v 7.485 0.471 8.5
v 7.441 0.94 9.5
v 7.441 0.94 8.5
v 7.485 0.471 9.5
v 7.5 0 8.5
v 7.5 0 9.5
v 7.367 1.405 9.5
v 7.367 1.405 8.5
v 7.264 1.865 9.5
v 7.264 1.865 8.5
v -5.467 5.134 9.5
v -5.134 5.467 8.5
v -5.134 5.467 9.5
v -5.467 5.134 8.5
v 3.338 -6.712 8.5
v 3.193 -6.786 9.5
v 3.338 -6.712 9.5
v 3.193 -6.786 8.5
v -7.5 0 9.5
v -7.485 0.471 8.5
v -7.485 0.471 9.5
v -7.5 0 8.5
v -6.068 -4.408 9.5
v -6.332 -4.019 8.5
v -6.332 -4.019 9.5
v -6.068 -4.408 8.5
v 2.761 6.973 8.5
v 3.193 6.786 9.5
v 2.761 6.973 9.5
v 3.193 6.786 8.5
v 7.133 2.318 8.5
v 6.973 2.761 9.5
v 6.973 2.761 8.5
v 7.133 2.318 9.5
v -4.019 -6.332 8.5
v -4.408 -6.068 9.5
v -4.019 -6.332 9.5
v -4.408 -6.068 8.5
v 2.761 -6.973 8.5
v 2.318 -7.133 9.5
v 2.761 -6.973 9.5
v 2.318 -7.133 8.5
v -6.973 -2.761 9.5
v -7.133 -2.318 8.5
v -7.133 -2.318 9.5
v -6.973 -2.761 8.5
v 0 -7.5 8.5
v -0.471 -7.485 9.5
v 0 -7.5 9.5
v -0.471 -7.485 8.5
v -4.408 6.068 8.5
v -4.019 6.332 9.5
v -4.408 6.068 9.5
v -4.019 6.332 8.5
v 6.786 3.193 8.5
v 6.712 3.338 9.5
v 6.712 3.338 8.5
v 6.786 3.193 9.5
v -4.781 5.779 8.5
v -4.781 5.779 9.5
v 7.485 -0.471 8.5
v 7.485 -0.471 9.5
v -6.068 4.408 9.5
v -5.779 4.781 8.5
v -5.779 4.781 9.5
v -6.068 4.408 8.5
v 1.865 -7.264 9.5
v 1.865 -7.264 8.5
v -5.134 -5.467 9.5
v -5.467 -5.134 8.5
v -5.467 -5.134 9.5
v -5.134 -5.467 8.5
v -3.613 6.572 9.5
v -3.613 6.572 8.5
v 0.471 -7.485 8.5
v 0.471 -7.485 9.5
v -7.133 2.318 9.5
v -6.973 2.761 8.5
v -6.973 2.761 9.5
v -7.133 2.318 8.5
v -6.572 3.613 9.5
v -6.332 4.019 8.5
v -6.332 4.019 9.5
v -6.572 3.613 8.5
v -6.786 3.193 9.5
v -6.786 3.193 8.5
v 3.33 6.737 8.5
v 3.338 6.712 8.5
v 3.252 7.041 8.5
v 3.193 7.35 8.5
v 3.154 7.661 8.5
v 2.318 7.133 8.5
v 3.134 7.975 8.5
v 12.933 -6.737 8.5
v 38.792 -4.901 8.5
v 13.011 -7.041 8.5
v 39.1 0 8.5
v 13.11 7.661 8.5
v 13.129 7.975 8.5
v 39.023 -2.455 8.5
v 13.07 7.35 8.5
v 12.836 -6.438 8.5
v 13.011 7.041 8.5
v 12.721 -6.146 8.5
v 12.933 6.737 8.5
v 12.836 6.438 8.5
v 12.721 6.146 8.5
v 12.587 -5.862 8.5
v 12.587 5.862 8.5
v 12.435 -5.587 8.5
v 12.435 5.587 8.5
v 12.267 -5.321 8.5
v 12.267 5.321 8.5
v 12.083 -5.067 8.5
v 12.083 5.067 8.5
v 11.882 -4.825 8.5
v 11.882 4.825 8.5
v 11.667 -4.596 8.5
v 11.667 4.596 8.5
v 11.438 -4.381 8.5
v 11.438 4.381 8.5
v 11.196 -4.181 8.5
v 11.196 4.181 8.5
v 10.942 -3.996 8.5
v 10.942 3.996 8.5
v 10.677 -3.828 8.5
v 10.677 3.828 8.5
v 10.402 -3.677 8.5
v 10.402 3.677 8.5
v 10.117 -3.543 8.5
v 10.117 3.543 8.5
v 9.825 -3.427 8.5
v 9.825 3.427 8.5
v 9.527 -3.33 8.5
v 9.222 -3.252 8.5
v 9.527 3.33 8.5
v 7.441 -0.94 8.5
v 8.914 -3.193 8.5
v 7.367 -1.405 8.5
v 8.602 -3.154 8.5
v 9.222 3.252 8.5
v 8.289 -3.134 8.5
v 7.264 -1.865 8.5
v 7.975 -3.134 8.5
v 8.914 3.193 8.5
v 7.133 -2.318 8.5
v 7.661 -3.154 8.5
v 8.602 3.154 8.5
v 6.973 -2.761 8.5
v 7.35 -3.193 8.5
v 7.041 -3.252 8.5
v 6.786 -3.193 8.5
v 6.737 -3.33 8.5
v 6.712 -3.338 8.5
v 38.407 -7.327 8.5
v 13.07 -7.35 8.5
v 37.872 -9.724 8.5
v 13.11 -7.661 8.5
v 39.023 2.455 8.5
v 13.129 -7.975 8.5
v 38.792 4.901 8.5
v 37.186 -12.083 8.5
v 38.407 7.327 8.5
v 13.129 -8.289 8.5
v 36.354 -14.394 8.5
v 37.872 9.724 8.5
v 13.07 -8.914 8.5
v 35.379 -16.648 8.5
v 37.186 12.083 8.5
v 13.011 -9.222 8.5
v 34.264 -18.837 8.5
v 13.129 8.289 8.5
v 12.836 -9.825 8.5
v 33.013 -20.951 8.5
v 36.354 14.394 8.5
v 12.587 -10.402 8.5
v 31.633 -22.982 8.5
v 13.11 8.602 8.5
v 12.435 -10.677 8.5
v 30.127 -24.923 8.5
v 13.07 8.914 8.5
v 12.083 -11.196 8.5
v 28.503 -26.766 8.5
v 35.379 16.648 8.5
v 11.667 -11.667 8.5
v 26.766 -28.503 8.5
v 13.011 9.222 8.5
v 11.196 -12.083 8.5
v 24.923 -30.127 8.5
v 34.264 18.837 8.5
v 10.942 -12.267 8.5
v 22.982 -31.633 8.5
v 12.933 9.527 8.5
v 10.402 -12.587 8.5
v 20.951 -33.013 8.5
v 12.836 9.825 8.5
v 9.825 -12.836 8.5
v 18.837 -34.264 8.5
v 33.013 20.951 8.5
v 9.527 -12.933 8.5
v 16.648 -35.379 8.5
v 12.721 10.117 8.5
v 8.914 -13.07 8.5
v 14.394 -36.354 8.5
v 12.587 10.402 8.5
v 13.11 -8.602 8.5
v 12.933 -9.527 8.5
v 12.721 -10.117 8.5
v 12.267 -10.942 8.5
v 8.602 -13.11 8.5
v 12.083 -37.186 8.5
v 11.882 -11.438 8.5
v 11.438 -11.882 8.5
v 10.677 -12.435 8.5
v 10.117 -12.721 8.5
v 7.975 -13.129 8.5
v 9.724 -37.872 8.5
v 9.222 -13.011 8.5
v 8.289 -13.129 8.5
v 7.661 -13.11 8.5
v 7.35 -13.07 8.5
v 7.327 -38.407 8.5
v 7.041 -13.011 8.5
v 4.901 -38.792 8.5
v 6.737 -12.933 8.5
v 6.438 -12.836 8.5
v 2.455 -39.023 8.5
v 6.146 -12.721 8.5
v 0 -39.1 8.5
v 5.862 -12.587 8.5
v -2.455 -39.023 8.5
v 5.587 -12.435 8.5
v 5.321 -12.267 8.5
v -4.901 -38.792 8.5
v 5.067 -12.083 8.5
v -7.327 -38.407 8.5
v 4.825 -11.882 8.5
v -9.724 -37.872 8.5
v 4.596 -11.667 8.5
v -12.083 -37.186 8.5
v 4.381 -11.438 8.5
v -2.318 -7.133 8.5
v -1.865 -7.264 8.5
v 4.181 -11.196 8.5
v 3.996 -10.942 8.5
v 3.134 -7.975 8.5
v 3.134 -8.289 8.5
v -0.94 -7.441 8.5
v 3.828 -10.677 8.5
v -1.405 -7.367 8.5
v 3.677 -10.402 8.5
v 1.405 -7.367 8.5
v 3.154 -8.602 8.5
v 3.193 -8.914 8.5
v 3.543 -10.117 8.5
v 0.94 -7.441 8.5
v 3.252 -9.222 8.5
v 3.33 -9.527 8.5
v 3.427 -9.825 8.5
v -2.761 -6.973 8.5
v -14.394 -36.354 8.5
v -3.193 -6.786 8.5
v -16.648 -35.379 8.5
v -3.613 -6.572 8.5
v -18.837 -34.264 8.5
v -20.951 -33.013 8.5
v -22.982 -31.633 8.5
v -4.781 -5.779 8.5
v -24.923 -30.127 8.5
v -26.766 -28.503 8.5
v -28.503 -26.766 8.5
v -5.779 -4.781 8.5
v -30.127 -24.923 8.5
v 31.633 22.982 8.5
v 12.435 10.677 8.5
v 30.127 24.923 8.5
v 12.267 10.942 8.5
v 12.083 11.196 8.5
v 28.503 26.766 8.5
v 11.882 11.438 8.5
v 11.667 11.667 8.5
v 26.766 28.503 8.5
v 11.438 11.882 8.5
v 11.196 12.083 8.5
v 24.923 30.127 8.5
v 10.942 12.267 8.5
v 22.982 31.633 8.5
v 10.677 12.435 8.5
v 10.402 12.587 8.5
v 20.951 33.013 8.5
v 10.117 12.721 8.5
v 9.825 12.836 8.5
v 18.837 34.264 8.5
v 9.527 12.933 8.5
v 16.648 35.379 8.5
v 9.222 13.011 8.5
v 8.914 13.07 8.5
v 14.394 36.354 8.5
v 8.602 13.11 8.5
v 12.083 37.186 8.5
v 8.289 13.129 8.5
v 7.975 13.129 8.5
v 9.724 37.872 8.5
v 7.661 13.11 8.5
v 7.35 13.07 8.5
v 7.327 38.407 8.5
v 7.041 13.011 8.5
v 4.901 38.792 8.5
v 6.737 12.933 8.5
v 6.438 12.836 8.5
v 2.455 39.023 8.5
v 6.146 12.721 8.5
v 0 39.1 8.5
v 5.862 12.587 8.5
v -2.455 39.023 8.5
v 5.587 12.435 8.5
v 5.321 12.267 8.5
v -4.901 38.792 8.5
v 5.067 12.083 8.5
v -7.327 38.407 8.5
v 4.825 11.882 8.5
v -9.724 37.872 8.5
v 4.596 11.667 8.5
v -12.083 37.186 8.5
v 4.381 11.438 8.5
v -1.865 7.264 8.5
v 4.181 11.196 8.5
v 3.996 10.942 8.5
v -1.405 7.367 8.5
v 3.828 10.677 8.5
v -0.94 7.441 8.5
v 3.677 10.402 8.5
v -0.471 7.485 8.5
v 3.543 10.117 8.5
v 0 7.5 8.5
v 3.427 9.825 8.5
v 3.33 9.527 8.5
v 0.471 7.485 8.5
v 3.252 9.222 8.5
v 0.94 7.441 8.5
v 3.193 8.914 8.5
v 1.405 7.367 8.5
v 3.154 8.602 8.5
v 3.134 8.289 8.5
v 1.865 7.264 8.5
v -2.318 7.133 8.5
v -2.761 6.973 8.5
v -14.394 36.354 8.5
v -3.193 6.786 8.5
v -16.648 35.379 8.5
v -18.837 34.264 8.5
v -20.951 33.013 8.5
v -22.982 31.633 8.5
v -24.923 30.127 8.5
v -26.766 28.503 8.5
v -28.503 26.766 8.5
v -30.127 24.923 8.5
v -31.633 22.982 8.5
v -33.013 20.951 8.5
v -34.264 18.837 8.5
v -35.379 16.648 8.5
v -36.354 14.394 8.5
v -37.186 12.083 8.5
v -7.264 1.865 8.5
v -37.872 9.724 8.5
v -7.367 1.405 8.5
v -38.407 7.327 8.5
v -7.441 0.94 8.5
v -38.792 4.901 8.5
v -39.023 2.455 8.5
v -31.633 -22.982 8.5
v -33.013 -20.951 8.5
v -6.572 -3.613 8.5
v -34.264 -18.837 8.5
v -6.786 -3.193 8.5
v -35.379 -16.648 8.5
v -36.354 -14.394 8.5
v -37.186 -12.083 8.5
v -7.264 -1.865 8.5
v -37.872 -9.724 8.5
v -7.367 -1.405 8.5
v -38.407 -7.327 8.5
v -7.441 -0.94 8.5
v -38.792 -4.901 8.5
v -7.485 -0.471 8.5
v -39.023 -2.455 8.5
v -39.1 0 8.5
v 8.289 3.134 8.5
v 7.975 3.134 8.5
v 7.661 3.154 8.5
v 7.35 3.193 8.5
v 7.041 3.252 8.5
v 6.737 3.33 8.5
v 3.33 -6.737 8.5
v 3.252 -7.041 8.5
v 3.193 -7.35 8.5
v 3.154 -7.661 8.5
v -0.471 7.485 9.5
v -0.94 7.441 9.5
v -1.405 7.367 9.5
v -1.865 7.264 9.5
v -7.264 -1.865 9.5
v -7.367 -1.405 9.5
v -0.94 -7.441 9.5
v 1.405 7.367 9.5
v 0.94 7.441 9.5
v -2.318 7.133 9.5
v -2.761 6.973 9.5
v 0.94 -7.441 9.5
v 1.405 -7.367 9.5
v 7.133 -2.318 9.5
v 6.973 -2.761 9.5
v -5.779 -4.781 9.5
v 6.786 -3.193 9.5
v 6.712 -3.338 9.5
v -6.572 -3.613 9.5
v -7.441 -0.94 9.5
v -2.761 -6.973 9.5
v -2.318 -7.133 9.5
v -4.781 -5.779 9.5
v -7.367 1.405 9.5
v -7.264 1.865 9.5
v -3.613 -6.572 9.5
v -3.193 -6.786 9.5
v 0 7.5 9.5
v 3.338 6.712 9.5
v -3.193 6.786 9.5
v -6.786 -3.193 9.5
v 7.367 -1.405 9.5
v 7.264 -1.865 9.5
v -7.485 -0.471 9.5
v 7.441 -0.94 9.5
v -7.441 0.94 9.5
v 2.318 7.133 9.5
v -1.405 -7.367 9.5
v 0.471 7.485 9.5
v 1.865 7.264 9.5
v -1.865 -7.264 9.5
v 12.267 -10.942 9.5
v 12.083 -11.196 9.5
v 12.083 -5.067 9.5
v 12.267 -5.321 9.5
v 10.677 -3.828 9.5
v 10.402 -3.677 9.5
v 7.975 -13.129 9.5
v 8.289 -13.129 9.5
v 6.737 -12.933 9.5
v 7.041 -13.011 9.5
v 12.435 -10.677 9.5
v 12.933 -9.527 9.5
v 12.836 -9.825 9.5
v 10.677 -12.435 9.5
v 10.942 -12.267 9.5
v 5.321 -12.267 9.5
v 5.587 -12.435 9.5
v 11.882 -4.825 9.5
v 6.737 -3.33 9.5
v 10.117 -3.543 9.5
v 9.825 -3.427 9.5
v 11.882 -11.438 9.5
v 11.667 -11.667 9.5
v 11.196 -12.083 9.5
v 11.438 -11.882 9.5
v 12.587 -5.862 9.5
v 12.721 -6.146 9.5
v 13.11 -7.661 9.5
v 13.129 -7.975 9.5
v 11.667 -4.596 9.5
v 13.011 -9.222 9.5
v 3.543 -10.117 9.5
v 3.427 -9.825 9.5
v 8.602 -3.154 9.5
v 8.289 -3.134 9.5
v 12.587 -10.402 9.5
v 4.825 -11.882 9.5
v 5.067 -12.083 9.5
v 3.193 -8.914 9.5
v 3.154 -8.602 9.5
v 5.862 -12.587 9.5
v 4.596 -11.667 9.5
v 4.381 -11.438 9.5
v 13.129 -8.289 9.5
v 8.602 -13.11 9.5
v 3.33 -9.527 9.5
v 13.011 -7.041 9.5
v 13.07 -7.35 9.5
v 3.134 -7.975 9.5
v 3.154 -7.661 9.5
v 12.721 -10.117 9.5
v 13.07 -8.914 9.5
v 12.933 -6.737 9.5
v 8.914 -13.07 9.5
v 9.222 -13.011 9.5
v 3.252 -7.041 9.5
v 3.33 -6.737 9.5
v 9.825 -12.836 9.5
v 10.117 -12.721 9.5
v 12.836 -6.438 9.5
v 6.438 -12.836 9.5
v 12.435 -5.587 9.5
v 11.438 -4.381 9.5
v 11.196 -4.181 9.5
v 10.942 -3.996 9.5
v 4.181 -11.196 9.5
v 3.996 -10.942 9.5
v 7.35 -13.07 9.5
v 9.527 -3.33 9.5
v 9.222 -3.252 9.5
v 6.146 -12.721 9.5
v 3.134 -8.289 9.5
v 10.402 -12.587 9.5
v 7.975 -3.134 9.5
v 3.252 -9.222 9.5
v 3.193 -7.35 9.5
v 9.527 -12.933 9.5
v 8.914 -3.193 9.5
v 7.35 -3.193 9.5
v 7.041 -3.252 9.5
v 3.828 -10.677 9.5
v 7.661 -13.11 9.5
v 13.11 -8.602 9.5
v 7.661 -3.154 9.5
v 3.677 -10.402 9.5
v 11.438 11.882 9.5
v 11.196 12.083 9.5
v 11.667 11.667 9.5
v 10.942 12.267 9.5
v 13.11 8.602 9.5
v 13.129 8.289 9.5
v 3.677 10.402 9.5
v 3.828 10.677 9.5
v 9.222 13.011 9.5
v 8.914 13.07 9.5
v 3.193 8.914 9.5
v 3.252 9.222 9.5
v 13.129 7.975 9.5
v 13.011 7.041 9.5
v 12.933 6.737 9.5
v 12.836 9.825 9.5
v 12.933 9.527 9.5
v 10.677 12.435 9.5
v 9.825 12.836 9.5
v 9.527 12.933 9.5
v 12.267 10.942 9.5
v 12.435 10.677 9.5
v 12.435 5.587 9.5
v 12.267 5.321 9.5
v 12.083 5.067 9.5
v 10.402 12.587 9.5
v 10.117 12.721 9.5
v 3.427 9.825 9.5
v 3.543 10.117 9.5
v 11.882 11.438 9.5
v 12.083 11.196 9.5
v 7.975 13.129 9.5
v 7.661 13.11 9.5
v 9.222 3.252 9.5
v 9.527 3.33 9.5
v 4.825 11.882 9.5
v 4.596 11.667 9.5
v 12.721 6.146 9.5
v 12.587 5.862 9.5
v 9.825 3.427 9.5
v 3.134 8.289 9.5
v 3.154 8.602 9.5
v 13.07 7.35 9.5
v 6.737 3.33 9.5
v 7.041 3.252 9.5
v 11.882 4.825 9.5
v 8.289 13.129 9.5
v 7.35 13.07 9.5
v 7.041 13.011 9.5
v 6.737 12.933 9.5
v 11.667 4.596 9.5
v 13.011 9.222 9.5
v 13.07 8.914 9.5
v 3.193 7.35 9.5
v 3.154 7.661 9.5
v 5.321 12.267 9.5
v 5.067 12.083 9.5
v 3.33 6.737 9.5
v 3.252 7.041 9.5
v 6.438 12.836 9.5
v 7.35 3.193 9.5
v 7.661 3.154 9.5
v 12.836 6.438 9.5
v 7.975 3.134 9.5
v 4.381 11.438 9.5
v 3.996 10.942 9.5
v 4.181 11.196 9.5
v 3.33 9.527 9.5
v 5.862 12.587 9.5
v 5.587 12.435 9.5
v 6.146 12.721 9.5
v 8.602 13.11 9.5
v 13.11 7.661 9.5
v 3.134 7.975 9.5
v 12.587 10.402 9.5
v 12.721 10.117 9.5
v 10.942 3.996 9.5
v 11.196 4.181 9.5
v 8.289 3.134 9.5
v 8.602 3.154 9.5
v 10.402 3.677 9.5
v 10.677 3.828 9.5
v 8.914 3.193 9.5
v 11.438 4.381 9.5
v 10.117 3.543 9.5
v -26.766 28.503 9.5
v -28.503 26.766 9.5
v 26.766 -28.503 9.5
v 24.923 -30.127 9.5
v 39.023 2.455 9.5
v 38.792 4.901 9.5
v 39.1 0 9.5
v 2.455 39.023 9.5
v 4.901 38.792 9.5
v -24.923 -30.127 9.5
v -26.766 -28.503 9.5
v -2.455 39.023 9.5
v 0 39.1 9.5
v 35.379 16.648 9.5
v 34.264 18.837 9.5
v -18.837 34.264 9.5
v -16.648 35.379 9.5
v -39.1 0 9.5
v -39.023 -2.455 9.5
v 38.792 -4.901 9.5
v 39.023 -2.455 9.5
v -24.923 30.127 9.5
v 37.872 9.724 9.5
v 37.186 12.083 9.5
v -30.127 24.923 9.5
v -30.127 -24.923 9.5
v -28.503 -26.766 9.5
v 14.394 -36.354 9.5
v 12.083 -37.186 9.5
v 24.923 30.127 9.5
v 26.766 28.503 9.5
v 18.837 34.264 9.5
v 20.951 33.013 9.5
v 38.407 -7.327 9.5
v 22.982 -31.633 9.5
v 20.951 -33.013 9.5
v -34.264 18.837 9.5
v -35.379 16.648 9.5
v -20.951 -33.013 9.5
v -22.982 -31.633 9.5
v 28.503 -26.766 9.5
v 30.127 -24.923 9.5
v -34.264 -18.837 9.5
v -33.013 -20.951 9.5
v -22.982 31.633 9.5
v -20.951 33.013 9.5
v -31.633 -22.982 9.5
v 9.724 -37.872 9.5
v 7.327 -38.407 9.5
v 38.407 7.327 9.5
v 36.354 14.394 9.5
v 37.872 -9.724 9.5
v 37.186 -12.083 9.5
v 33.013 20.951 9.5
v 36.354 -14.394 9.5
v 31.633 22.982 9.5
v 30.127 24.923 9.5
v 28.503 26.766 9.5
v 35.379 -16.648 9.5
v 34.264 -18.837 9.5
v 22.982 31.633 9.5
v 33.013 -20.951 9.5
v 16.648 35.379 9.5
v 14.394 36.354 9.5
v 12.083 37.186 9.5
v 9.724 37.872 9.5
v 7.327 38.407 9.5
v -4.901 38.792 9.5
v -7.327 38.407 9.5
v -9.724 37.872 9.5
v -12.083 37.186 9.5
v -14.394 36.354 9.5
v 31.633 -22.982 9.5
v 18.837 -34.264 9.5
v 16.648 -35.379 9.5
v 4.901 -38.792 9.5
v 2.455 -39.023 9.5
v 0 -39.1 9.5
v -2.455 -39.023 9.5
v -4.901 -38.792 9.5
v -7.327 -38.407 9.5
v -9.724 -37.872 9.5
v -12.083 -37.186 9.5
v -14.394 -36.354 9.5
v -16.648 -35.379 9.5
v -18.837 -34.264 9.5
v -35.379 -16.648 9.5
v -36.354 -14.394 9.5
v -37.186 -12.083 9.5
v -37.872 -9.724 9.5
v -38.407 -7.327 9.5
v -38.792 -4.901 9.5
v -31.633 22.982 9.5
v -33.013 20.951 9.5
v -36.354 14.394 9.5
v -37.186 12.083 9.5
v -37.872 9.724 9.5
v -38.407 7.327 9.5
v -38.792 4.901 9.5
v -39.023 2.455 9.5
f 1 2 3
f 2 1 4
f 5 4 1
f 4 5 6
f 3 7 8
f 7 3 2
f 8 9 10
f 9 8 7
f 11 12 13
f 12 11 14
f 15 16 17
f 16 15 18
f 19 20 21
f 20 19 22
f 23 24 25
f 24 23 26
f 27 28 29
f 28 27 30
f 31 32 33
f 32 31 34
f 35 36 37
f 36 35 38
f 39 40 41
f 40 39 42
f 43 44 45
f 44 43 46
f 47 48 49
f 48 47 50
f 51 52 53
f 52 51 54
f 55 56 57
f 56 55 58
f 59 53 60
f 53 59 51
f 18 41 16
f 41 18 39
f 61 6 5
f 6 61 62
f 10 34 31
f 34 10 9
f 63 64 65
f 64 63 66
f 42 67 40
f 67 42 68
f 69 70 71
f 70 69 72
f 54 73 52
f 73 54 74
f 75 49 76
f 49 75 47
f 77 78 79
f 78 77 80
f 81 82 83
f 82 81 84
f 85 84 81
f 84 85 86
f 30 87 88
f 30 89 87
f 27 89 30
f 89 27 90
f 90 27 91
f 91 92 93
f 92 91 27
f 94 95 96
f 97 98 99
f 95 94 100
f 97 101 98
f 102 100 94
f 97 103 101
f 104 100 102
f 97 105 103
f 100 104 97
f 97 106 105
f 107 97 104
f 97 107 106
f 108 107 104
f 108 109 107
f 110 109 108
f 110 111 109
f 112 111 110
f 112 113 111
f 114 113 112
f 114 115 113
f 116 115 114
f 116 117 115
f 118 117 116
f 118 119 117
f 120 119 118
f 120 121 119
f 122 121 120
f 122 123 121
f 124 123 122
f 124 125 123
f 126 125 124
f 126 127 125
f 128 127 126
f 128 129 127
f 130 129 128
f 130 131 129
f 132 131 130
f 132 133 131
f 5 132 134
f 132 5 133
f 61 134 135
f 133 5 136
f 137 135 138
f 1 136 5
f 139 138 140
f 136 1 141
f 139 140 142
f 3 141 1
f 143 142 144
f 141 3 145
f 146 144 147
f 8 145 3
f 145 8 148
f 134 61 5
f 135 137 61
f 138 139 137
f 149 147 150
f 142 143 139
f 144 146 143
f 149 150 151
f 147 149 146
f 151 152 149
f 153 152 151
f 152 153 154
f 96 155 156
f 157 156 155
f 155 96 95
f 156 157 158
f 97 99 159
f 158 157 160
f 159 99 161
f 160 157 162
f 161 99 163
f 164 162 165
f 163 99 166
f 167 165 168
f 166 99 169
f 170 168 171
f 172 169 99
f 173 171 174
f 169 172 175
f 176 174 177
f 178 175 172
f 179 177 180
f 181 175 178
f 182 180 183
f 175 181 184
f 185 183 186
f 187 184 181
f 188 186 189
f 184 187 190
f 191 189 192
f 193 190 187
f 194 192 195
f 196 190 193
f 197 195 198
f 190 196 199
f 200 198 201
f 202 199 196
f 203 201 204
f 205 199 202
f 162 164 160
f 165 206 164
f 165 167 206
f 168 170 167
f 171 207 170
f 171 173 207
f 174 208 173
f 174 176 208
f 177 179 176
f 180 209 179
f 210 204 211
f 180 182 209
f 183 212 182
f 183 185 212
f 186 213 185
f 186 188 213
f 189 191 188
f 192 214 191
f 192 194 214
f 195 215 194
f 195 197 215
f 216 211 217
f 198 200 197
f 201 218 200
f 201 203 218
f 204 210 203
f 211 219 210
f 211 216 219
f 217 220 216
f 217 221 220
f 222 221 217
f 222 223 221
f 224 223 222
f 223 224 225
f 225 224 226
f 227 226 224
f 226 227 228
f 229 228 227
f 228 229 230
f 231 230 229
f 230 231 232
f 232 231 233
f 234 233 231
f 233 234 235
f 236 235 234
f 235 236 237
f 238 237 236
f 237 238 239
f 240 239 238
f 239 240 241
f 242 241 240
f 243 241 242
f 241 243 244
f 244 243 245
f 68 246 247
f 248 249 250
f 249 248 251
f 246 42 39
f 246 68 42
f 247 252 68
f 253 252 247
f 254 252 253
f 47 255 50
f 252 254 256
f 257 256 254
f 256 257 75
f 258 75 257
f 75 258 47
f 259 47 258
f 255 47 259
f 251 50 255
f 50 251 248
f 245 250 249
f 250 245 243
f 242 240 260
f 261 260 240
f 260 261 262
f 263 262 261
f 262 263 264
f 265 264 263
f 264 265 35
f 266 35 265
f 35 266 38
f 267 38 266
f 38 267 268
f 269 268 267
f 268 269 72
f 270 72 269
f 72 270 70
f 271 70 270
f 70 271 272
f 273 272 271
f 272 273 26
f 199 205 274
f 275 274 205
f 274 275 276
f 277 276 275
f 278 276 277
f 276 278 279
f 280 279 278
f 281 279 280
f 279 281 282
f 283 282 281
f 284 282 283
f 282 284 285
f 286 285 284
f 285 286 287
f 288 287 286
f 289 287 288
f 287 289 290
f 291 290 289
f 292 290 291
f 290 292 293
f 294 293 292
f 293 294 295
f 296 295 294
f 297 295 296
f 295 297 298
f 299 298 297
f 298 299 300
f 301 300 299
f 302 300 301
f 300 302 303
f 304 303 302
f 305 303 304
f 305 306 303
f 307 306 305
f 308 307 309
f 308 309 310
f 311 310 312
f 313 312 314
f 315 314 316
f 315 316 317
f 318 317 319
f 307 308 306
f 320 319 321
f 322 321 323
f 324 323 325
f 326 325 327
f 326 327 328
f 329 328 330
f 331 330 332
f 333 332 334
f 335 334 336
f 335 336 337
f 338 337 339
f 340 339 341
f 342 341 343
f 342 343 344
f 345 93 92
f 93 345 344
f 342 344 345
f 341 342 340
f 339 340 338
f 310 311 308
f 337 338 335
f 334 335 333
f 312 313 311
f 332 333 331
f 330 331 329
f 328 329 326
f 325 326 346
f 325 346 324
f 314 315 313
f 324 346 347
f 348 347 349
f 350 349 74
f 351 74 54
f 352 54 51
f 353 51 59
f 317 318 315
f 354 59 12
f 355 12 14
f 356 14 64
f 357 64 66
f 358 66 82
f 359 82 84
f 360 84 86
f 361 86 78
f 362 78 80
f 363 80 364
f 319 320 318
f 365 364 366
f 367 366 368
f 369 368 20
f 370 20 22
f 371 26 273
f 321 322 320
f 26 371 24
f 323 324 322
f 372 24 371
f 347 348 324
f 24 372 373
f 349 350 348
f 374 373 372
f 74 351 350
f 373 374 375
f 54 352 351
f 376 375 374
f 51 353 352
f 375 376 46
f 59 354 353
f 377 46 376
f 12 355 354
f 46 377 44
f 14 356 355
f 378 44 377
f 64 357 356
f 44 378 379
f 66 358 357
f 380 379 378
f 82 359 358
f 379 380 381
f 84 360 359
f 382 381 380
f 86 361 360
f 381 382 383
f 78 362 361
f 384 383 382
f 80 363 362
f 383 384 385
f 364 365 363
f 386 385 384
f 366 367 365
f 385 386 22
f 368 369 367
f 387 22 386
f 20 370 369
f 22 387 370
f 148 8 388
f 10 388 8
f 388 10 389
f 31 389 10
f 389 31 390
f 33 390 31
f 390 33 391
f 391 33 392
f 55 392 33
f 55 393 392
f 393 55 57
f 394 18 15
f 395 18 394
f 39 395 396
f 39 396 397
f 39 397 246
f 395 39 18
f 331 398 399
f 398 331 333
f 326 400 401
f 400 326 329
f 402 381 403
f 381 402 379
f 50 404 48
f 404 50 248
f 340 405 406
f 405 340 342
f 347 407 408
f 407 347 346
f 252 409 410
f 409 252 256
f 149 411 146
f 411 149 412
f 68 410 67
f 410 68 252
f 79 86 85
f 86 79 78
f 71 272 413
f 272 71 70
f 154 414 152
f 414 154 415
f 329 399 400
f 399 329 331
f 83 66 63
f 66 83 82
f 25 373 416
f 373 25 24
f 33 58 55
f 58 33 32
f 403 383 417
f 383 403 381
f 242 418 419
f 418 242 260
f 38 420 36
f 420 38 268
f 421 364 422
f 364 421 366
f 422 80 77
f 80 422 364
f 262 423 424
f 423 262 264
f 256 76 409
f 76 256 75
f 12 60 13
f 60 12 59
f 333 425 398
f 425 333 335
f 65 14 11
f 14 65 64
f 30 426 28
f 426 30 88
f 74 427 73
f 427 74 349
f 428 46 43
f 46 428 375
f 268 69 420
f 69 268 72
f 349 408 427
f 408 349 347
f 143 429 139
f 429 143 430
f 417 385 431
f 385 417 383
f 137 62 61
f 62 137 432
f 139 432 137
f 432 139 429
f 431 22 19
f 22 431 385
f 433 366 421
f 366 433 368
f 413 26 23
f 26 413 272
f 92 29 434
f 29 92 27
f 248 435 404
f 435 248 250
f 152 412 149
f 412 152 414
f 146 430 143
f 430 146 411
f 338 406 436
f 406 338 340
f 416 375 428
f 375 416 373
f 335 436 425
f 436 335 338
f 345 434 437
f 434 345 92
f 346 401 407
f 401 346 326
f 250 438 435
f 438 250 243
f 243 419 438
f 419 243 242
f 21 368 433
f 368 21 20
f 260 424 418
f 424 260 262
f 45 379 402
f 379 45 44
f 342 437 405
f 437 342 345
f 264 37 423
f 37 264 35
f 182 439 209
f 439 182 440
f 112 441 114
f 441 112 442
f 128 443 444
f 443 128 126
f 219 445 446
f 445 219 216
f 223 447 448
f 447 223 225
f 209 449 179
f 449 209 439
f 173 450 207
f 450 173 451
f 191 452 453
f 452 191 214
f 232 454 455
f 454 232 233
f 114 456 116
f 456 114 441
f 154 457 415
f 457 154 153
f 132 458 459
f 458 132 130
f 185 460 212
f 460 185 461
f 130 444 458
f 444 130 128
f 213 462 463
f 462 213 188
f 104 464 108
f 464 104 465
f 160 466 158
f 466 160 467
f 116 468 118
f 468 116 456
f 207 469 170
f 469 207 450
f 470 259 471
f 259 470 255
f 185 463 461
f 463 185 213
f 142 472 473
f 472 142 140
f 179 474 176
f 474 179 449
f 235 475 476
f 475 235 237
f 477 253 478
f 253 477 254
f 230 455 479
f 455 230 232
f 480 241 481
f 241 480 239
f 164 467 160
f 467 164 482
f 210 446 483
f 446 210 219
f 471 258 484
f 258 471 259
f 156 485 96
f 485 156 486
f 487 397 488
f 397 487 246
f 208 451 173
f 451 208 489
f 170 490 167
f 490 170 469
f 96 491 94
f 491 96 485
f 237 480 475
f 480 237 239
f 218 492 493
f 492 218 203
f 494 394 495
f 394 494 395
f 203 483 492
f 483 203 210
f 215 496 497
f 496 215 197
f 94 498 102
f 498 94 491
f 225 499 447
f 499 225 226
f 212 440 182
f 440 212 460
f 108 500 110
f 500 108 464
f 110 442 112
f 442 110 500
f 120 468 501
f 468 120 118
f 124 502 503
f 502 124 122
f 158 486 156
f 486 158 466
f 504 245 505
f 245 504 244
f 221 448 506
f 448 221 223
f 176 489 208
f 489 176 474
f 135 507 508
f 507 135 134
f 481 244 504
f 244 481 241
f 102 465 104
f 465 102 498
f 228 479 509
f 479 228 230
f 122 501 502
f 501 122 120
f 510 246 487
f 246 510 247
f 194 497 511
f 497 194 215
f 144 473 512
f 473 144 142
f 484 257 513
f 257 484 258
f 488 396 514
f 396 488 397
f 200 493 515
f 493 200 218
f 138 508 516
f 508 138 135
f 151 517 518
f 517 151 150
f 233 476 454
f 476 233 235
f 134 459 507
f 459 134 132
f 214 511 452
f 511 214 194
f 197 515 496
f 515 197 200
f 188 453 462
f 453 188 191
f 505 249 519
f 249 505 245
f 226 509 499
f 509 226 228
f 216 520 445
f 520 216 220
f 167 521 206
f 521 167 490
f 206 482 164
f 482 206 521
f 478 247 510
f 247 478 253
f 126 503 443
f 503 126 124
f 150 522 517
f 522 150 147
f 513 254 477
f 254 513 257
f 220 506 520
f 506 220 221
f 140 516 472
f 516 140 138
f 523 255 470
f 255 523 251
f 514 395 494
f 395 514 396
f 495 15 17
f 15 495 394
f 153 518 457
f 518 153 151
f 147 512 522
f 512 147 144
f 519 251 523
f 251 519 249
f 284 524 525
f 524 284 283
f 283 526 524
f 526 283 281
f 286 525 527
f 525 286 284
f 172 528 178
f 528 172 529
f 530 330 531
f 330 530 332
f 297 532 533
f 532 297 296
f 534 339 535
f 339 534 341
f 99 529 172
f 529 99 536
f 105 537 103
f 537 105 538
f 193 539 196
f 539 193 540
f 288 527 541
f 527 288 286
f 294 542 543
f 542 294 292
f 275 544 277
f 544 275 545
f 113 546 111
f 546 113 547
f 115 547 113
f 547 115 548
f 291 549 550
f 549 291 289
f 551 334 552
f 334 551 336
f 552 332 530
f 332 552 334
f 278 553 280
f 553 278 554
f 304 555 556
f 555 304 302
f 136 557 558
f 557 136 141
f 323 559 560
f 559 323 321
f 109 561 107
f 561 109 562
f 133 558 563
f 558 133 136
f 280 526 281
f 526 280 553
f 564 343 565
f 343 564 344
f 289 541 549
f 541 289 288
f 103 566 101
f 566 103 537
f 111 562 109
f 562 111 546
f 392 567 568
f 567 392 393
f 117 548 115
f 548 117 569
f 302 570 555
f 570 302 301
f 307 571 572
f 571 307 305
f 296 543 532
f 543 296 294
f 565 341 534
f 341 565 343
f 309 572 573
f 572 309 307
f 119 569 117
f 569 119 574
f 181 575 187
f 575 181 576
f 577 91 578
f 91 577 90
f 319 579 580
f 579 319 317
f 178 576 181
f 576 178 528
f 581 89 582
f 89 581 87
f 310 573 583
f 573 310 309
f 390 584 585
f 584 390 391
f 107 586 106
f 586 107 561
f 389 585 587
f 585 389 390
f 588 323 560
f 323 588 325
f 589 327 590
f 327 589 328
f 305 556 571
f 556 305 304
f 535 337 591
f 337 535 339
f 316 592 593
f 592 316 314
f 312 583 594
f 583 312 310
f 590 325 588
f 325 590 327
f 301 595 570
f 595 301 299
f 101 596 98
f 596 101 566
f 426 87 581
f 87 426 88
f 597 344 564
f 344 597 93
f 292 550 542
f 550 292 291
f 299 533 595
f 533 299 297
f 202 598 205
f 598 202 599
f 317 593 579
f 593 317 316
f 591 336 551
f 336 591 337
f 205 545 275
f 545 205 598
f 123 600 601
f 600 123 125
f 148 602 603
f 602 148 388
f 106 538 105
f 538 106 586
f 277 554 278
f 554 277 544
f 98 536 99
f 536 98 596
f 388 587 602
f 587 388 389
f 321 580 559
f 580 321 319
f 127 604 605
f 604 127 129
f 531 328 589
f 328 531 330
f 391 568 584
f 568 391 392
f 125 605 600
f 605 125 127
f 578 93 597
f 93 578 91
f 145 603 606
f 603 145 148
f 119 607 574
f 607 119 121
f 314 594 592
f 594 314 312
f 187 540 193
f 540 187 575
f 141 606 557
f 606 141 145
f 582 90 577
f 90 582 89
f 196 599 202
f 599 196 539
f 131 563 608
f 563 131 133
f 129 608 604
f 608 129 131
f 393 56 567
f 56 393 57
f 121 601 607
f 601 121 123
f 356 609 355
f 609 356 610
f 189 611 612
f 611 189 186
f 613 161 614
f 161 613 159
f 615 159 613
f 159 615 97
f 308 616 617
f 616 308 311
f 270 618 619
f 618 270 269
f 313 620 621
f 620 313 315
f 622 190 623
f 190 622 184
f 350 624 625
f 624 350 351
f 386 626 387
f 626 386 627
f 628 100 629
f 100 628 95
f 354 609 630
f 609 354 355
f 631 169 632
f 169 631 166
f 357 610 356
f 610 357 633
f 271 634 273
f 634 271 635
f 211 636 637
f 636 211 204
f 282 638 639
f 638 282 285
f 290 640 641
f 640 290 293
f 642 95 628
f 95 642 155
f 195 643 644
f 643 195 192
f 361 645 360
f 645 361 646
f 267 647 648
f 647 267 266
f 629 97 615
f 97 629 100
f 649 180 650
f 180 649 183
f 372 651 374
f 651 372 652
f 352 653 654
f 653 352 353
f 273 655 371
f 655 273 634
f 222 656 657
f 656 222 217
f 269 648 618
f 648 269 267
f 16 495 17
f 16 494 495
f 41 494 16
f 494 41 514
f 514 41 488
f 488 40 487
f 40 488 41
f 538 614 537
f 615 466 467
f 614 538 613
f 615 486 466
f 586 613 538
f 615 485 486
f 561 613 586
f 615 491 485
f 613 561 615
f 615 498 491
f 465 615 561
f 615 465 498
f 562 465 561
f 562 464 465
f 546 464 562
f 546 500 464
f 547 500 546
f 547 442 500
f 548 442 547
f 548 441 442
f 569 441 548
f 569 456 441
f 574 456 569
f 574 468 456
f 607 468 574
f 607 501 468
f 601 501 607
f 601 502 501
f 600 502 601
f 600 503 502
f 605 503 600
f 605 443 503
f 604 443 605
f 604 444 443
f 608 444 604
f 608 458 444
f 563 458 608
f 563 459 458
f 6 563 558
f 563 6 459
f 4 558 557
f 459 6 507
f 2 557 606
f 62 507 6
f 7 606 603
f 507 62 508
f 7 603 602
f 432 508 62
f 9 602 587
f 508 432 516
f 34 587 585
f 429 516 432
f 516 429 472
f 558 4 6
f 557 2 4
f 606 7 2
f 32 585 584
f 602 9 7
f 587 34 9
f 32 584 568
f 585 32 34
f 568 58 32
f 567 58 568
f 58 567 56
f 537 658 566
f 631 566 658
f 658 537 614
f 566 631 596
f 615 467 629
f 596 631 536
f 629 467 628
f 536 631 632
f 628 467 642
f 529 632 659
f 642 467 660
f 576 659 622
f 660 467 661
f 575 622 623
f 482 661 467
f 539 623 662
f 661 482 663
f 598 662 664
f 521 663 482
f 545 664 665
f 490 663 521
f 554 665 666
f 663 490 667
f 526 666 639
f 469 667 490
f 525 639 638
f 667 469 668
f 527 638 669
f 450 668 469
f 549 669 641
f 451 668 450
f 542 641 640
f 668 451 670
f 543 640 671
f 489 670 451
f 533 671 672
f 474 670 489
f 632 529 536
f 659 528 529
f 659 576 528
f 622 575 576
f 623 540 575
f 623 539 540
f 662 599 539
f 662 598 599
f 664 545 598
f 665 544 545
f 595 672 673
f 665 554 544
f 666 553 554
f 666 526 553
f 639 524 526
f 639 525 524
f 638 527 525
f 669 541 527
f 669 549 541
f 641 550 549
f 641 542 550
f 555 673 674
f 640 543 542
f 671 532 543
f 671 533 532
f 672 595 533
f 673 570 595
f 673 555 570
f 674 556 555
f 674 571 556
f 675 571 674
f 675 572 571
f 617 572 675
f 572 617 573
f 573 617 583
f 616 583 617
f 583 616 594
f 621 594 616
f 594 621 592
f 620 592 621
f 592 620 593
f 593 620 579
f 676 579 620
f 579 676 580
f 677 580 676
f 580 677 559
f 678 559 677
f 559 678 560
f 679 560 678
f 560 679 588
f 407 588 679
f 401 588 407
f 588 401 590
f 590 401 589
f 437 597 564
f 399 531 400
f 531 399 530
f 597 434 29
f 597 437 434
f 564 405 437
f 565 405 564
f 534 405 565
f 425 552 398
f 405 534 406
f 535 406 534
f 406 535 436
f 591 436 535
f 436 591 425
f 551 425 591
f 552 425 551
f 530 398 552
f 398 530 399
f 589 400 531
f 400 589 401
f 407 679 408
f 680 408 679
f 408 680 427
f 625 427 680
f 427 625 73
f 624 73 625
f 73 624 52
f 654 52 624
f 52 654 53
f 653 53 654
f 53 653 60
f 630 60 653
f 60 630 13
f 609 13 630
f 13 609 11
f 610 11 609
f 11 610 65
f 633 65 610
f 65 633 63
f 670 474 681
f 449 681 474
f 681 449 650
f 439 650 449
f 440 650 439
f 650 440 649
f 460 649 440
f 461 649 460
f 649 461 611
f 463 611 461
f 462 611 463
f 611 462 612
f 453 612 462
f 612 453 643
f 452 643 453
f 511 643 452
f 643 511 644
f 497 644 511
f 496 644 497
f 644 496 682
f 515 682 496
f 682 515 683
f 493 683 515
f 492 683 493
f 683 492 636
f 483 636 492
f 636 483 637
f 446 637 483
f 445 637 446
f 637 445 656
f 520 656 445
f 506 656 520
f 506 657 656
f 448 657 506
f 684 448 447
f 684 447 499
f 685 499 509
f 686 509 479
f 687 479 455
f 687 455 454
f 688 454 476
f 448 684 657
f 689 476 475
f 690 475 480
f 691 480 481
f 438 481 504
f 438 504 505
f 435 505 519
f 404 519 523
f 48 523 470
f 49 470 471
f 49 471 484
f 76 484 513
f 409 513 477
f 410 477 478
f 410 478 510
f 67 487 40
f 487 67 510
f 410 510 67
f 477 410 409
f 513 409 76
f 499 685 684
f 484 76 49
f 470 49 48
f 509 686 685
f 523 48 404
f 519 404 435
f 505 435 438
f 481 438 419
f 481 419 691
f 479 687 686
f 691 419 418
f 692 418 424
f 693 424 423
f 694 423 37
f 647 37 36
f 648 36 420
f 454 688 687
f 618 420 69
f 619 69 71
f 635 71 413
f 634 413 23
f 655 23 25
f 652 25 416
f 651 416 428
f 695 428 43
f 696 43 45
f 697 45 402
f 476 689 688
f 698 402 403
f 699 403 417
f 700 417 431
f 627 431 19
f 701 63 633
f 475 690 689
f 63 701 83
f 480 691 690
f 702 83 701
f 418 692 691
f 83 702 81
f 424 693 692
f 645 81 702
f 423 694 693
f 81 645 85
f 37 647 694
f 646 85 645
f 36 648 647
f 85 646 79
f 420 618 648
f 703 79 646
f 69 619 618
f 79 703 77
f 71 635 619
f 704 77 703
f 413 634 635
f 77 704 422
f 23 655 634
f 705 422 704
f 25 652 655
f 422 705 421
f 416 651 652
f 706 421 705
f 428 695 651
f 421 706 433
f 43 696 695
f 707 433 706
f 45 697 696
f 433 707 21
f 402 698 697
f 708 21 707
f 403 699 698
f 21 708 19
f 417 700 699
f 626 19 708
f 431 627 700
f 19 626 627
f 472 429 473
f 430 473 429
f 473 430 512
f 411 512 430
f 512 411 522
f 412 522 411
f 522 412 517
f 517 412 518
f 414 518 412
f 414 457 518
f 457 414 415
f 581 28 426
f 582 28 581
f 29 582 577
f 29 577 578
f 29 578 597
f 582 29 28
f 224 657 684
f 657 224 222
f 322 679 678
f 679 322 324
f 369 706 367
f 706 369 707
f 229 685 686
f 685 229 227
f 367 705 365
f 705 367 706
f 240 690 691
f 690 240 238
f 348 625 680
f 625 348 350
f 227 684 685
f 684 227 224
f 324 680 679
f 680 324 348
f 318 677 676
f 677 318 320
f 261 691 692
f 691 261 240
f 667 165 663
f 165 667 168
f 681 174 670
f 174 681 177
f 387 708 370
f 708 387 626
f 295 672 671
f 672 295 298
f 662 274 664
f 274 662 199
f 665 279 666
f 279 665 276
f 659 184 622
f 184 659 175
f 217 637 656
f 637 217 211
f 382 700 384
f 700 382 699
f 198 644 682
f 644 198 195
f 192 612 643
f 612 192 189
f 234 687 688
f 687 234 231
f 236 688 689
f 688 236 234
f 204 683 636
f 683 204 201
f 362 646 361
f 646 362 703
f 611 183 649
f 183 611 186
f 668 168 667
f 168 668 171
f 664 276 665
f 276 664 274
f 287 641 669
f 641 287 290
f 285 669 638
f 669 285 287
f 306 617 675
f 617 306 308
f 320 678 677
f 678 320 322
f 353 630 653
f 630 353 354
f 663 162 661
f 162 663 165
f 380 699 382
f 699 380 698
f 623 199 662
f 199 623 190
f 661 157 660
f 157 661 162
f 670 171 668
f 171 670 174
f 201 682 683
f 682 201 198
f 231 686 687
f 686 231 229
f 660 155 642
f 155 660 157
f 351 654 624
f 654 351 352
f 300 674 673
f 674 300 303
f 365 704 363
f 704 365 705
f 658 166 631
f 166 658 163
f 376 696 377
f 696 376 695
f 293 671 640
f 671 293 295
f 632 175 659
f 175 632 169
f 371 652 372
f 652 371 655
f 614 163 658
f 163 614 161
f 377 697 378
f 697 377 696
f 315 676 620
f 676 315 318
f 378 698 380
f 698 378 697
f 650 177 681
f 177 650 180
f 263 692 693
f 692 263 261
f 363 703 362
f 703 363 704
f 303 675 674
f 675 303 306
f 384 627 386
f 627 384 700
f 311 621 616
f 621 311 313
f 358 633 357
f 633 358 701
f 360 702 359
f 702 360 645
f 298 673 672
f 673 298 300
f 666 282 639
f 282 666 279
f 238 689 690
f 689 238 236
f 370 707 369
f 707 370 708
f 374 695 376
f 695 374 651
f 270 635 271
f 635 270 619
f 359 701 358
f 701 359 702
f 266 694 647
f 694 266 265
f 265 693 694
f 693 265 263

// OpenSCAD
supports = true;
epsilon = 0.1;

ring_inner_r = 37.1;
ring_thickness = 3;
ring_height = 8;

blocker_height = 1.5;
blocker_width = 14;
blocker_length = 1.2;
blocker_pad = 8;
blocker_pad_rot = asin(blocker_pad / 2 / ring_inner_r);
blocker_rot = blocker_pad_rot + asin(blocker_width / 4 / ring_inner_r) * 2;
blocker_big_width = 5;
blocker_big_length = 1.6;
blocker_big_rot = - blocker_pad_rot + 2 * blocker_rot + asin(blocker_big_width / 4 / ring_inner_r) * 2;
blocker_triangle_rot = blocker_big_rot + asin(blocker_big_width / 4 / ring_inner_r) * 2 + asin(4 / 4 / ring_inner_r) * 2;

holder_height = 1.5;
holder_thickness = 0.8;
holder_length = 2.1;
holder_width = 20;
bokey_height = 1;
bokey_r = ring_inner_r + ring_thickness - holder_thickness - 0.2;

module ring() {
	difference() {
		cylinder(ring_height, ring_inner_r + ring_thickness, ring_inner_r + ring_thickness);
		cylinder(ring_height, ring_inner_r, ring_inner_r);
	}
}

module ring_blocker_outer() {
	difference() {
		cylinder(blocker_height, ring_inner_r, ring_inner_r);
		cylinder(blocker_height, ring_inner_r - blocker_length, ring_inner_r - blocker_length);
	}	
}


module ring_blocker_inner() {
	difference() {
		cylinder(blocker_height, ring_inner_r, ring_inner_r);
		cylinder(blocker_height, ring_inner_r - blocker_big_length, ring_inner_r - blocker_big_length);
	}	
}

module ring_holder_lower() {
	translate([0, 0, ring_height]) {
		difference() {
			cylinder(holder_height, ring_inner_r + holder_thickness + holder_length, ring_inner_r + holder_thickness + holder_length);
			cylinder(holder_height, ring_inner_r + holder_length, ring_inner_r + holder_length);
		}	
	}
}

module ring_holder_upper() {
	translate([0, 0, ring_height + holder_height]) {
		difference() {
			cylinder(holder_height, ring_inner_r + holder_thickness + holder_length, ring_inner_r + holder_thickness + holder_length);
			cylinder(holder_height, ring_inner_r, ring_inner_r);
		}	
	}
}

module blockers_outer() {
	rotate([0, 0, blocker_rot]) {
		translate([ring_inner_r, 0, 0]) {
			cube([20, blocker_width, 100], true);
		}
	}
	rotate([0, 0, -blocker_rot]) {
		translate([ring_inner_r, 0, 0]) {
			cube([20, blocker_width, 100], true);
		}
	}
	
	rotate([0, 0, -blocker_triangle_rot]) {
		translate([ring_inner_r, 0, 0]) {
			linear_extrude(blocker_height) {
				polygon([
					[0, 0],
					[-1, -0.5],
					[0, -2.5]
				]);
			}
		}
	}
}

module blockers_inner() {
	rotate([0, 0, blocker_big_rot]) {
		translate([ring_inner_r, 0, 0]) {
			cube([20, blocker_big_width, 100], true);
		}
	}

	rotate([0, 0, -blocker_big_rot]) {
		translate([ring_inner_r, 0, 0]) {
			cube([20, blocker_big_width, 100], true);
		}
	}
}

module half_blockers() {
	intersection() {
		ring_blocker_inner();
		blockers_inner();
	}
	
	intersection() {
		ring_blocker_outer();
		blockers_outer();
	}
}

module holder() {
	intersection() {
		ring_holder_lower();
		translate([ring_inner_r, 0, ring_height + holder_height / 2]) {
			cube([20, holder_width, holder_height], true);
		}
	}

	intersection() {
		ring_holder_upper();
		translate([ring_inner_r, 0, ring_height + holder_height + holder_thickness / 2]) {
			cube([20, holder_width, holder_thickness], true);
		}
	}

	if (supports) {
		intersection() {
			translate([0, 0, ring_height + epsilon]) {
				difference() {
					cylinder(holder_height - 2 * epsilon, ring_inner_r + epsilon, ring_inner_r + epsilon);
					cylinder(holder_height - 2 * epsilon, ring_inner_r, ring_inner_r);
				}	
			}
			translate([ring_inner_r, 0, ring_height + holder_height / 2]) {
				cube([20, holder_width, holder_height], true);
			}
		}
	}
}

$fn=100;

module boke_support() {
	ring();
	half_blockers();
	rotate([0, 0, 180])
		half_blockers();
	
	holder();
	rotate([0, 0, 180])
		holder();
}

module boke() {
	cylinder(bokey_height, bokey_r, bokey_r);	
}

module sym_mickey() {
	mickey_r = 5;
	cylinder(10, mickey_r * 1.5, mickey_r * 1.5);
	rotate([0, 0, -45])
	translate([mickey_r * 2.3, 0, 0])
		cylinder(10, mickey_r, mickey_r);
	rotate([0, 0, 45])
	translate([mickey_r * 2.3, 0, 0])
		cylinder(10, mickey_r, mickey_r);
}

translate([0,0,8.5]) {
difference() {
	boke();
	sym_mickey();
}
}

//boke_support();
